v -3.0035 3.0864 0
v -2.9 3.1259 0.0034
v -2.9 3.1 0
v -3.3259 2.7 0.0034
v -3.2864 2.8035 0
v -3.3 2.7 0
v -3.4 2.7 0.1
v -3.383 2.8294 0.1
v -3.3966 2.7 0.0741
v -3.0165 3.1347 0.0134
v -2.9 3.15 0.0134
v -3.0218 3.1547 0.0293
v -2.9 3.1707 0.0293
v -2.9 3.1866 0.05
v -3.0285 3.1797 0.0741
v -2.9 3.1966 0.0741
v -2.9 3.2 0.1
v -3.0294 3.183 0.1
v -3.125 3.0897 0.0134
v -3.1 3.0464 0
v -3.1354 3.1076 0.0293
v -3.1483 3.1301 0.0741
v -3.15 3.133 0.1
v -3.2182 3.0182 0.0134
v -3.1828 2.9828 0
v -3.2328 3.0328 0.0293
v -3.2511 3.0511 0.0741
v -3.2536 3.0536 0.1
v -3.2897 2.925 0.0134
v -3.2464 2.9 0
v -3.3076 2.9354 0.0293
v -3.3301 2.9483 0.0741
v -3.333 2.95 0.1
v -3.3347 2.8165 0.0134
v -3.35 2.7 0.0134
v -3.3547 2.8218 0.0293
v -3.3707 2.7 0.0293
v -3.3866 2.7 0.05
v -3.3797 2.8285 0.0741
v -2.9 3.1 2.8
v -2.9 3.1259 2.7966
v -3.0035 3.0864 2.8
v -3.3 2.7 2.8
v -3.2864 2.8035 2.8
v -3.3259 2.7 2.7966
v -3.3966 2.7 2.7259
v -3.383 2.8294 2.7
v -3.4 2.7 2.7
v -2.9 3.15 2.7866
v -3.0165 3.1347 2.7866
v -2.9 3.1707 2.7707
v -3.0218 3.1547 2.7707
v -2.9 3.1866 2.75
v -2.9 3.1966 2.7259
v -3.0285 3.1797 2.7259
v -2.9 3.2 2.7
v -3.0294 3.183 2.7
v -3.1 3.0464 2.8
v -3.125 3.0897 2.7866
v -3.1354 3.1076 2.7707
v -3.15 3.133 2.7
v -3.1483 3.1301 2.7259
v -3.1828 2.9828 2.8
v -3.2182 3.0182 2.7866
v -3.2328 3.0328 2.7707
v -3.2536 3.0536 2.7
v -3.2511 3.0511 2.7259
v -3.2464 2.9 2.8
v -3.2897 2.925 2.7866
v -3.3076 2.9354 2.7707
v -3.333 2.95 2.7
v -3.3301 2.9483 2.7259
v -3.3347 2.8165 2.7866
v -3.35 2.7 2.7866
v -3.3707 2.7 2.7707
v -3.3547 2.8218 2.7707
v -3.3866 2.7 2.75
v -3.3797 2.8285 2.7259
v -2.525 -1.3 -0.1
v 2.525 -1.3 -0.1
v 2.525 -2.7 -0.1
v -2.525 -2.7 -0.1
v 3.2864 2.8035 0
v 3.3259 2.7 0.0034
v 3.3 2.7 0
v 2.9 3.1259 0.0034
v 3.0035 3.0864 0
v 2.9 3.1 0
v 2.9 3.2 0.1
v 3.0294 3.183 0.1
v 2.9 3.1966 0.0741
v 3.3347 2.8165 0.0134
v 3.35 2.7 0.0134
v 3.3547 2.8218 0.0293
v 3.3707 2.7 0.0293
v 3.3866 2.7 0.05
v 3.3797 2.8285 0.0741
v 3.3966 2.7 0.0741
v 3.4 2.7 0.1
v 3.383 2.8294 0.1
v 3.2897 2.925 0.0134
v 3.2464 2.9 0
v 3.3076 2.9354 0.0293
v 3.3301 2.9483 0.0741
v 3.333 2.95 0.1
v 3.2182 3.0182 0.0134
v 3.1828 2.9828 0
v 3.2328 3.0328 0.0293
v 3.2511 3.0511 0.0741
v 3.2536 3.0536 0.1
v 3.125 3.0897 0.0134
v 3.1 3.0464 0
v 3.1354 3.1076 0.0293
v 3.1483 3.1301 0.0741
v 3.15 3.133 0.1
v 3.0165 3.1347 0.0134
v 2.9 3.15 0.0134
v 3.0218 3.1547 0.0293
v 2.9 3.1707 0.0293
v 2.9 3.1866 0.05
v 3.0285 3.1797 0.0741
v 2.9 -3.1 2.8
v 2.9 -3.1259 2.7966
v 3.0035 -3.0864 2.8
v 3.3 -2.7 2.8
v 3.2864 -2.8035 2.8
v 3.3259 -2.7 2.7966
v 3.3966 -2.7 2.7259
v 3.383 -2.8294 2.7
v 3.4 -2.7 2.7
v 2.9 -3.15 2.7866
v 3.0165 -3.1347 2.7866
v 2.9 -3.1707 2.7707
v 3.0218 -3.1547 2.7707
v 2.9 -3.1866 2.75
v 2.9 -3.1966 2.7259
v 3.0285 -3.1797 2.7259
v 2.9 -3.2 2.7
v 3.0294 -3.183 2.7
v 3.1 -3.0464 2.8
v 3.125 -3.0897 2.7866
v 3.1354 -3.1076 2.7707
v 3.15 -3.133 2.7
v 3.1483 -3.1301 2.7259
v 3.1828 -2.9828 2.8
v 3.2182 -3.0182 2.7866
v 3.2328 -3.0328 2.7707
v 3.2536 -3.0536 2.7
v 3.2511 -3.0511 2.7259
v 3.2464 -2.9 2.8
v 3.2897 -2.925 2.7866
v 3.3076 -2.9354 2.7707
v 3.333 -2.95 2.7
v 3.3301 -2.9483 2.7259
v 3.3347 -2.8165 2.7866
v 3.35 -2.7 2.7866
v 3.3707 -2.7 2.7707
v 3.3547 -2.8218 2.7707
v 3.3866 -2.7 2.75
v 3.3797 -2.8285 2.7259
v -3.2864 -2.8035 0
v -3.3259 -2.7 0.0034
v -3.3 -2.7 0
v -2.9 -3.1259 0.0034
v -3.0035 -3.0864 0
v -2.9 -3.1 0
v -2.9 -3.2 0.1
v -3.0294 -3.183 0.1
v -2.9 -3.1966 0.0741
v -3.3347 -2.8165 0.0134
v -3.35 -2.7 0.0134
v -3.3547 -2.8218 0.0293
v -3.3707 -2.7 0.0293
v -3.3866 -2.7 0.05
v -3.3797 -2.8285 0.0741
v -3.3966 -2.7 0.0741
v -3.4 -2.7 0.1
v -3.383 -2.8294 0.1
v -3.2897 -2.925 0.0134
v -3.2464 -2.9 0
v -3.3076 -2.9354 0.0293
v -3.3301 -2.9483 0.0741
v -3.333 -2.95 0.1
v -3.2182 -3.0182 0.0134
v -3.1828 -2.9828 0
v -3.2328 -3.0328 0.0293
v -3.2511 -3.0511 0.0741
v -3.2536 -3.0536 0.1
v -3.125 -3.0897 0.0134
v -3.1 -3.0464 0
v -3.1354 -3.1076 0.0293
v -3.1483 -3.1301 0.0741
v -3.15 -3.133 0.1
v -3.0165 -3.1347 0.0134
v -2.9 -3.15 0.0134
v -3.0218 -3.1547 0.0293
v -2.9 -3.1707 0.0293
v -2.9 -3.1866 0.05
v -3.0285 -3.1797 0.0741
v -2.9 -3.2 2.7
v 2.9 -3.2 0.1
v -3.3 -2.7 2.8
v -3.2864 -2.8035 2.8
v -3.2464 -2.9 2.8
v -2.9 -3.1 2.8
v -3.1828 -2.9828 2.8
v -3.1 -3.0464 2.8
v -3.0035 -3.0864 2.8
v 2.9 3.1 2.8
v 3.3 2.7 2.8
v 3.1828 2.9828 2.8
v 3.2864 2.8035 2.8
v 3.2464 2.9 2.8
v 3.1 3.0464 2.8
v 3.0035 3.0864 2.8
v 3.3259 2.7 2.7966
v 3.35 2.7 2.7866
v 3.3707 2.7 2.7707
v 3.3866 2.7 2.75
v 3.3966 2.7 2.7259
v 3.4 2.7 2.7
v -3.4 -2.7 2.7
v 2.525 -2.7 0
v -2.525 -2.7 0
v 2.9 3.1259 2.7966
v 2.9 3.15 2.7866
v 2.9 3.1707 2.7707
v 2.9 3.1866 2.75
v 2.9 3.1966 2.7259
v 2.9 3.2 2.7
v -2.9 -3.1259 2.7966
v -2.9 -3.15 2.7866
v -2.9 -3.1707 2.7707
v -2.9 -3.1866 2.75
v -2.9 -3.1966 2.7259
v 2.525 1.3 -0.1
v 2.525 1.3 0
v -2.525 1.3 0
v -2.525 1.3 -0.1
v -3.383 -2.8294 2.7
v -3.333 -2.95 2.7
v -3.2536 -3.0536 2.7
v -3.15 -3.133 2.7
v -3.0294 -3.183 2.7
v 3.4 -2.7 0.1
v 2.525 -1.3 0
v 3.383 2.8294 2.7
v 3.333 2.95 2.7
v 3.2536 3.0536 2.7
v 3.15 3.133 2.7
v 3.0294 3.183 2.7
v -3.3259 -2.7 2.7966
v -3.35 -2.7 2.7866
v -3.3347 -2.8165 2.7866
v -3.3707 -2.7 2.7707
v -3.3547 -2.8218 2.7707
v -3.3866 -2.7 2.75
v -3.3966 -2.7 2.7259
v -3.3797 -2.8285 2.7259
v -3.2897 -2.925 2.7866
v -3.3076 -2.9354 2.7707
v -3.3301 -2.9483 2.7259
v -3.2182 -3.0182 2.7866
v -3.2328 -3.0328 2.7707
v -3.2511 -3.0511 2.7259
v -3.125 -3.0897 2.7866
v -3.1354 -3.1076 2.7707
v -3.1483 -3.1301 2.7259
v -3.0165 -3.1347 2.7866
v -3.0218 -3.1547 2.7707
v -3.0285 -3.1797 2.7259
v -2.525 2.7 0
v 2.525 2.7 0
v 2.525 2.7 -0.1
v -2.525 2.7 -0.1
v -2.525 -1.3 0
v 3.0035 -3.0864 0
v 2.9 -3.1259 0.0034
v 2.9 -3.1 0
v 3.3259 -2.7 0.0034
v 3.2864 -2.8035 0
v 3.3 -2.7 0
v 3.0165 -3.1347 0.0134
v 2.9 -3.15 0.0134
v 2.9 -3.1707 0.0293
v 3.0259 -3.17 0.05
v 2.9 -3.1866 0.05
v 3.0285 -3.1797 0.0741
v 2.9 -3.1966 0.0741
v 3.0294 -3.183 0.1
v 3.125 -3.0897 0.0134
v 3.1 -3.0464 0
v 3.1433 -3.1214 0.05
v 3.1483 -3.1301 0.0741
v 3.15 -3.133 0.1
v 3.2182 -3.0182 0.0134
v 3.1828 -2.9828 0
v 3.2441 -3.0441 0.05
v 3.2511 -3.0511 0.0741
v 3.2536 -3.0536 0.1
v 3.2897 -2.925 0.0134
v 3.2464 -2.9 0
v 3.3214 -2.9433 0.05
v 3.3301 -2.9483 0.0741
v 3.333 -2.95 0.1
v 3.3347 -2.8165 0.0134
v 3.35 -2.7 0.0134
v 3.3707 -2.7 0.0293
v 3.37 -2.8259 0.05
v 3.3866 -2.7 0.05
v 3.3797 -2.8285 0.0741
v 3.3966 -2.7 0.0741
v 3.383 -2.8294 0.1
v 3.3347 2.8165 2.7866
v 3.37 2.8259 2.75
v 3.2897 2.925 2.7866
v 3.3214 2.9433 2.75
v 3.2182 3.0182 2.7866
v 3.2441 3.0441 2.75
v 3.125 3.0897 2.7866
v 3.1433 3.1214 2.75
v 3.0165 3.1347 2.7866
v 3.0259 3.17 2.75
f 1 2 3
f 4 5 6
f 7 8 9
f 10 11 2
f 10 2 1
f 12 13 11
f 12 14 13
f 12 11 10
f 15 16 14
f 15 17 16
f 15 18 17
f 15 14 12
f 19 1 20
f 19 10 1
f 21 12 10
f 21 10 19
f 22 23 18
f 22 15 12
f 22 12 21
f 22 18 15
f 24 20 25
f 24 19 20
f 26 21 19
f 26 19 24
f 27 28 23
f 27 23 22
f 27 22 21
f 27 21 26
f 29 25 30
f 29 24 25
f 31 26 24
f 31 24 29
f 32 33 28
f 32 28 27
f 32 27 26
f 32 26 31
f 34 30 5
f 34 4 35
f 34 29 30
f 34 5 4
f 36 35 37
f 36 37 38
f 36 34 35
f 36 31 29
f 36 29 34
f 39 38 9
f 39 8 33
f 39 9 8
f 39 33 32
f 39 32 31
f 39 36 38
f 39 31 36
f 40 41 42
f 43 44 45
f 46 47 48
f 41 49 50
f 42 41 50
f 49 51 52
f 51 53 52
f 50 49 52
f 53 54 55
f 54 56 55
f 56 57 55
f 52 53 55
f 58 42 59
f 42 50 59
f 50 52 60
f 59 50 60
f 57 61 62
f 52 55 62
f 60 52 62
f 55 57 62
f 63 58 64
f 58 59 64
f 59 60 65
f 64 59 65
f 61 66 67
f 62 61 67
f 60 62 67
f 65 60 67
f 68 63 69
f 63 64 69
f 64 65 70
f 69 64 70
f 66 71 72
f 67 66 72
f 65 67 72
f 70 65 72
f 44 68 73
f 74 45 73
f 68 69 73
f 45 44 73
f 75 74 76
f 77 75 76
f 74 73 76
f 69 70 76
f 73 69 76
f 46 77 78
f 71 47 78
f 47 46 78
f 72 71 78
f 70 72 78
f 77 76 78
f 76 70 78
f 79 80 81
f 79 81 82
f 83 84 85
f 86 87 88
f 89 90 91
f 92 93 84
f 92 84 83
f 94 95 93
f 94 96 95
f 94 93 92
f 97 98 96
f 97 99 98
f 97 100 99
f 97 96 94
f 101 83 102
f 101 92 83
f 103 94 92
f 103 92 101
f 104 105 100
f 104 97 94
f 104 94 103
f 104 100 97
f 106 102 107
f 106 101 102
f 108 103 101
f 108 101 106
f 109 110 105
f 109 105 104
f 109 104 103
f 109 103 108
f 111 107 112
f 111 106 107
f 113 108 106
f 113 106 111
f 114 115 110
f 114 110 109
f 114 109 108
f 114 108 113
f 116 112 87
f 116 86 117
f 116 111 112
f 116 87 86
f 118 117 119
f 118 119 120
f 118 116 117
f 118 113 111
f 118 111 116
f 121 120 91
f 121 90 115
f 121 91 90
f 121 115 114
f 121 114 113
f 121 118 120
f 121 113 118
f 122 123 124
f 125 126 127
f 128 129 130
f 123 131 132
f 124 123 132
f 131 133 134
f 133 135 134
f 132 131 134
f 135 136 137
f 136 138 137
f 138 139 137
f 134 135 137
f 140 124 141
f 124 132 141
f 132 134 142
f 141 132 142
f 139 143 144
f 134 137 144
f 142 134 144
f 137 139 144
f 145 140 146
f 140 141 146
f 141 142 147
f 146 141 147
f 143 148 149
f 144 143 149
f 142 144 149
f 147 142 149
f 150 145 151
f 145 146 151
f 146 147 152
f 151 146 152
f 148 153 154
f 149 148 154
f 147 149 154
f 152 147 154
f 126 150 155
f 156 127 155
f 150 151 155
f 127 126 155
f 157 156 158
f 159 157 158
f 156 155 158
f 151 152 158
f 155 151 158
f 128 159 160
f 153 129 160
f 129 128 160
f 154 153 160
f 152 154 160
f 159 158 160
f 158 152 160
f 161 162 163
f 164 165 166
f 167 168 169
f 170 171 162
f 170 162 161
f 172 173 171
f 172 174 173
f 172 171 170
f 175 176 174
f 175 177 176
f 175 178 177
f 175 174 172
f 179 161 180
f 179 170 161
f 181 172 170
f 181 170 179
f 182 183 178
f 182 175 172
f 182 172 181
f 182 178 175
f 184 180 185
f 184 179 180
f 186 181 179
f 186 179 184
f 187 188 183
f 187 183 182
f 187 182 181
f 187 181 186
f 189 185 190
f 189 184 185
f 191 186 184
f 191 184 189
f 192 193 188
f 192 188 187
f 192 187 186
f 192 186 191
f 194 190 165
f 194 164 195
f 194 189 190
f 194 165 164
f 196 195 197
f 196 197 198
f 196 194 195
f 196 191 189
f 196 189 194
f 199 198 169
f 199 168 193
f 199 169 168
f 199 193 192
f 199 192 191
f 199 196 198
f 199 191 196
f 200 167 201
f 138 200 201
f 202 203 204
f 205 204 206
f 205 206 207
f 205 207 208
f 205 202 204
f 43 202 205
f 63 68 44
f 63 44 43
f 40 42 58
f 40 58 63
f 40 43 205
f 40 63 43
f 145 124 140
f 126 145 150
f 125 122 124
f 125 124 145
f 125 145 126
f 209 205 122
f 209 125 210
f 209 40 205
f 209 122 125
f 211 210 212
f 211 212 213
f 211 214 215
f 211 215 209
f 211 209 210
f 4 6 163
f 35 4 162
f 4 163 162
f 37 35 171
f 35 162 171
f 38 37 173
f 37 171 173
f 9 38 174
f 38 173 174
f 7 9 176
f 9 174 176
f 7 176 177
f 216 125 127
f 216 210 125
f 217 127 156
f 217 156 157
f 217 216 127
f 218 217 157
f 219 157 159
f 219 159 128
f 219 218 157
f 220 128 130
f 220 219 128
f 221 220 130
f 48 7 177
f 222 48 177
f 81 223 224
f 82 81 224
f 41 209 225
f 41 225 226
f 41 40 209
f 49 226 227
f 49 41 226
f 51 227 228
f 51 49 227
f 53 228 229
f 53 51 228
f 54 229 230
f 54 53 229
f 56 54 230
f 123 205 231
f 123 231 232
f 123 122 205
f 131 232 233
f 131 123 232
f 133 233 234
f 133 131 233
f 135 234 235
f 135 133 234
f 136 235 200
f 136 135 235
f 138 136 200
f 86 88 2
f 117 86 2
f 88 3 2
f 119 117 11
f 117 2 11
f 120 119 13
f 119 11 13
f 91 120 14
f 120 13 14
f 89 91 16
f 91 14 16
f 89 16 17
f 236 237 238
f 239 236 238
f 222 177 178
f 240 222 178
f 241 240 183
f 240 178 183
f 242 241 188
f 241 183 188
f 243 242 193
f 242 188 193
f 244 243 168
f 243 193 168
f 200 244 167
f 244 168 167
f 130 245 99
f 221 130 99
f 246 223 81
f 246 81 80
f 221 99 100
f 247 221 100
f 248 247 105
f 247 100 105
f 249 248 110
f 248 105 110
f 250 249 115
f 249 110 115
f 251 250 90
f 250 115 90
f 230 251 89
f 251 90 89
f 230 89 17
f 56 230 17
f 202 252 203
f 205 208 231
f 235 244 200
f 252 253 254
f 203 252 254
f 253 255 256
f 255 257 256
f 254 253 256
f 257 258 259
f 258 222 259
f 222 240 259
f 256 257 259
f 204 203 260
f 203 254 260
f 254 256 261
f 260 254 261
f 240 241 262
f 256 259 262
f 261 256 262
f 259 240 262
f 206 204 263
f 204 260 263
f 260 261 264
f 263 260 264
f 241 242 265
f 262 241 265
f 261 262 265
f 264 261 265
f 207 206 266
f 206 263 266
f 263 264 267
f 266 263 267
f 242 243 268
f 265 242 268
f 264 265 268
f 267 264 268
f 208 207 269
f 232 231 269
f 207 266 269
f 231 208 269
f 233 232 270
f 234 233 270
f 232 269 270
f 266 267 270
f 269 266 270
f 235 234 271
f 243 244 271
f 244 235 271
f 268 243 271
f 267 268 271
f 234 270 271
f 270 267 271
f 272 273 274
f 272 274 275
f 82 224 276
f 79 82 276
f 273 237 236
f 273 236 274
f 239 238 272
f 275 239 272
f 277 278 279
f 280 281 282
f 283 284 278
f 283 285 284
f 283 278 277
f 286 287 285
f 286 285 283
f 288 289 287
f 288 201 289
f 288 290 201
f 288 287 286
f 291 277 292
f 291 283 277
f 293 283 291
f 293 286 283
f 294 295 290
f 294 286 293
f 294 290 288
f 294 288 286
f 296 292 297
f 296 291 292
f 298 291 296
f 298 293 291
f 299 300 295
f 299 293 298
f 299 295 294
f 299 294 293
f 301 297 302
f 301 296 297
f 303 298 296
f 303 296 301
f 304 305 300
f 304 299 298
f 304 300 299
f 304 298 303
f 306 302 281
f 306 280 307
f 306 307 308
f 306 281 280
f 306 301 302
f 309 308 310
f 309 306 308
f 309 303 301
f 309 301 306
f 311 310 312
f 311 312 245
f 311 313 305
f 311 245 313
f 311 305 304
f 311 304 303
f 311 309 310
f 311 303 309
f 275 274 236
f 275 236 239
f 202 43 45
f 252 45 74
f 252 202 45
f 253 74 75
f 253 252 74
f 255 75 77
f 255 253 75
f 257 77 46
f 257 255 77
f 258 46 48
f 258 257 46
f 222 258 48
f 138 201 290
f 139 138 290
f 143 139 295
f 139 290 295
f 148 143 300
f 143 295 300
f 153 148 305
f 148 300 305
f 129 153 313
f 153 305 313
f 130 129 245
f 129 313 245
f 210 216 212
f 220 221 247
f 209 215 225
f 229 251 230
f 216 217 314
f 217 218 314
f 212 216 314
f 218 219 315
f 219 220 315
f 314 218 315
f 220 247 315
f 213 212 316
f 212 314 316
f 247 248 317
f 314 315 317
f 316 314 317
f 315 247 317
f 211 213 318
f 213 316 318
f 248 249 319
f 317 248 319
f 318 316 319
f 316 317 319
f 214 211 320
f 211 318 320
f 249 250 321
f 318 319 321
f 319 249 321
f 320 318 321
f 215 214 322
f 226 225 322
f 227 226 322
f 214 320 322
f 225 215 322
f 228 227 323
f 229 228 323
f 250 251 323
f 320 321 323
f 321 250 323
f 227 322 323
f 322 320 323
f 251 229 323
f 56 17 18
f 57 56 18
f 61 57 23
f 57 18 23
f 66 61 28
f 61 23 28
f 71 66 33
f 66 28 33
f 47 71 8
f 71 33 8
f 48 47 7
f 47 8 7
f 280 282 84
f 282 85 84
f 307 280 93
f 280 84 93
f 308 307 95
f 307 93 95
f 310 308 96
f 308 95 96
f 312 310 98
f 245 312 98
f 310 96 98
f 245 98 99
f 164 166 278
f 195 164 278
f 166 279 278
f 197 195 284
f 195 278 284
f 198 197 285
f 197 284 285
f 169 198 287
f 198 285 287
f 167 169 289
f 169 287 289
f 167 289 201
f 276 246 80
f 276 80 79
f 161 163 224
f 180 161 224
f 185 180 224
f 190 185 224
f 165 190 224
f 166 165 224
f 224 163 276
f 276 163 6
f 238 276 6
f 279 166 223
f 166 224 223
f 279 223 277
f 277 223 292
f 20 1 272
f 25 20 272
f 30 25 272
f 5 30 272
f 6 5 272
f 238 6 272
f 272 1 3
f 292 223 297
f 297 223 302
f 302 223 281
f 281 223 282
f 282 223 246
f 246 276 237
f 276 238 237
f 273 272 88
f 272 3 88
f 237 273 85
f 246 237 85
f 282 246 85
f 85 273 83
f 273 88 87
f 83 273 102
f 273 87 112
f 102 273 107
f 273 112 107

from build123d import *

# Parameters (mm, degrees)
BOSS_EXTRUDE1_DEPTH = 2.8
SKETCH2_W           = 5.05
SKETCH2_H           = 1.4
BOSS_EXTRUDE2_DEPTH = 0.1
FILLET1_R           = 0.1


with BuildPart() as part:
    # Sketch1 → Boss-Extrude1 (new body)
    with BuildSketch(Plane.XY):
        with BuildLine():
            Line((-2.9, -3.2), (2.9, -3.2))
            ThreePointArc((2.9, -3.2), (3.253553391, -3.053553391), (3.4, -2.7))
            Line((3.4, -2.7), (3.4, 2.7))
            ThreePointArc((3.4, 2.7), (3.253553391, 3.053553391), (2.9, 3.2))
            Line((2.9, 3.2), (-2.9, 3.2))
            ThreePointArc((-2.9, 3.2), (-3.253553391, 3.053553391), (-3.4, 2.7))
            Line((-3.4, 2.7), (-3.4, -2.7))
            ThreePointArc((-3.4, -2.7), (-3.253553391, -3.053553391), (-2.9, -3.2))
        make_face()
    extrude(amount=BOSS_EXTRUDE1_DEPTH)

    # Sketch2 → Boss-Extrude2 (add)
    with BuildSketch(Plane(origin=(0, 0, 0), x_dir=(-1, 0, 0), z_dir=(0, 0, -1))):
        with Locations((0, 2)):
            Rectangle(SKETCH2_W, SKETCH2_H)
        with Locations((0, -2)):
            Rectangle(SKETCH2_W, SKETCH2_H)
    extrude(amount=BOSS_EXTRUDE2_DEPTH)

    # Fillet1
    fillet1_edges = [part.edges().sort_by_distance(p)[0] for p in [
        (3.253553391, 3.053553391, 2.8),
        (3.4, 0, 0),
        (3.253553391, -3.053553391, 0),
        (0, 3.2, 2.8),
        (-3.253553391, 3.053553391, 2.8),
        (-3.4, 0, 2.8),
        (-3.253553391, -3.053553391, 2.8),
        (0, -3.2, 2.8),
        (3.253553391, -3.053553391, 2.8),
        (3.4, 0, 2.8),
        (0, -3.2, 0),
        (-3.253553391, -3.053553391, 0),
        (-3.4, 0, 0),
        (-3.253553391, 3.053553391, 0),
        (0, 3.2, 0),
        (3.253553391, 3.053553391, 0),
    ]]
    fillet(fillet1_edges, radius=FILLET1_R)


solid = part.part
